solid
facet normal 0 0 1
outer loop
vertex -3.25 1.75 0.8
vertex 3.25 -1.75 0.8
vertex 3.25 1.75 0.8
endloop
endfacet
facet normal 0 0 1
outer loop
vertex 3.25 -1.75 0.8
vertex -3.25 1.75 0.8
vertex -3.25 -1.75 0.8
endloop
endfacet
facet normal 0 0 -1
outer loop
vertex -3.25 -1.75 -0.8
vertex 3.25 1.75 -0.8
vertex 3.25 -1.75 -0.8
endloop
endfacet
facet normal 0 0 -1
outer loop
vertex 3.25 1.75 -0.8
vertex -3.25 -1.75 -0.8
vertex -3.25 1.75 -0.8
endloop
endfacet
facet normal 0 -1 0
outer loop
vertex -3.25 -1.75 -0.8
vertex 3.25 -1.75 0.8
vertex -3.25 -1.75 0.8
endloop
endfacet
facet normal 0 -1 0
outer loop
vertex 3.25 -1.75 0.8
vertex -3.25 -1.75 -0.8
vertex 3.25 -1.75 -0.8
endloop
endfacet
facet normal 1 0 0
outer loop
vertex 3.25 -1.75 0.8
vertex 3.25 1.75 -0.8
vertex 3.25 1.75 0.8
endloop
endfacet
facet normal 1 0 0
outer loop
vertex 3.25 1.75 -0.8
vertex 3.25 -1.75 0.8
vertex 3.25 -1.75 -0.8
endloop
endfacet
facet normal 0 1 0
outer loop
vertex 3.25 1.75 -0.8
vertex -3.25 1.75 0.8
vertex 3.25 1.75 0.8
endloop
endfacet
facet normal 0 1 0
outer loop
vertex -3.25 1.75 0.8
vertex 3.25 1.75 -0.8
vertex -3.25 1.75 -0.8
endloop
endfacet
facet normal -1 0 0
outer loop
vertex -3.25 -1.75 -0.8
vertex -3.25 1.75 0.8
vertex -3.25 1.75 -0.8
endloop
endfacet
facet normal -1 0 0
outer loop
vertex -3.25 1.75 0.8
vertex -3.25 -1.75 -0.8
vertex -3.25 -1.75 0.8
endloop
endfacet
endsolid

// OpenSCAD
module smd() {
    translate([-6.5/2, -3.5/2, -1.6/2])
        cube([6.5, 3.5, 1.6]);
}

smd();
